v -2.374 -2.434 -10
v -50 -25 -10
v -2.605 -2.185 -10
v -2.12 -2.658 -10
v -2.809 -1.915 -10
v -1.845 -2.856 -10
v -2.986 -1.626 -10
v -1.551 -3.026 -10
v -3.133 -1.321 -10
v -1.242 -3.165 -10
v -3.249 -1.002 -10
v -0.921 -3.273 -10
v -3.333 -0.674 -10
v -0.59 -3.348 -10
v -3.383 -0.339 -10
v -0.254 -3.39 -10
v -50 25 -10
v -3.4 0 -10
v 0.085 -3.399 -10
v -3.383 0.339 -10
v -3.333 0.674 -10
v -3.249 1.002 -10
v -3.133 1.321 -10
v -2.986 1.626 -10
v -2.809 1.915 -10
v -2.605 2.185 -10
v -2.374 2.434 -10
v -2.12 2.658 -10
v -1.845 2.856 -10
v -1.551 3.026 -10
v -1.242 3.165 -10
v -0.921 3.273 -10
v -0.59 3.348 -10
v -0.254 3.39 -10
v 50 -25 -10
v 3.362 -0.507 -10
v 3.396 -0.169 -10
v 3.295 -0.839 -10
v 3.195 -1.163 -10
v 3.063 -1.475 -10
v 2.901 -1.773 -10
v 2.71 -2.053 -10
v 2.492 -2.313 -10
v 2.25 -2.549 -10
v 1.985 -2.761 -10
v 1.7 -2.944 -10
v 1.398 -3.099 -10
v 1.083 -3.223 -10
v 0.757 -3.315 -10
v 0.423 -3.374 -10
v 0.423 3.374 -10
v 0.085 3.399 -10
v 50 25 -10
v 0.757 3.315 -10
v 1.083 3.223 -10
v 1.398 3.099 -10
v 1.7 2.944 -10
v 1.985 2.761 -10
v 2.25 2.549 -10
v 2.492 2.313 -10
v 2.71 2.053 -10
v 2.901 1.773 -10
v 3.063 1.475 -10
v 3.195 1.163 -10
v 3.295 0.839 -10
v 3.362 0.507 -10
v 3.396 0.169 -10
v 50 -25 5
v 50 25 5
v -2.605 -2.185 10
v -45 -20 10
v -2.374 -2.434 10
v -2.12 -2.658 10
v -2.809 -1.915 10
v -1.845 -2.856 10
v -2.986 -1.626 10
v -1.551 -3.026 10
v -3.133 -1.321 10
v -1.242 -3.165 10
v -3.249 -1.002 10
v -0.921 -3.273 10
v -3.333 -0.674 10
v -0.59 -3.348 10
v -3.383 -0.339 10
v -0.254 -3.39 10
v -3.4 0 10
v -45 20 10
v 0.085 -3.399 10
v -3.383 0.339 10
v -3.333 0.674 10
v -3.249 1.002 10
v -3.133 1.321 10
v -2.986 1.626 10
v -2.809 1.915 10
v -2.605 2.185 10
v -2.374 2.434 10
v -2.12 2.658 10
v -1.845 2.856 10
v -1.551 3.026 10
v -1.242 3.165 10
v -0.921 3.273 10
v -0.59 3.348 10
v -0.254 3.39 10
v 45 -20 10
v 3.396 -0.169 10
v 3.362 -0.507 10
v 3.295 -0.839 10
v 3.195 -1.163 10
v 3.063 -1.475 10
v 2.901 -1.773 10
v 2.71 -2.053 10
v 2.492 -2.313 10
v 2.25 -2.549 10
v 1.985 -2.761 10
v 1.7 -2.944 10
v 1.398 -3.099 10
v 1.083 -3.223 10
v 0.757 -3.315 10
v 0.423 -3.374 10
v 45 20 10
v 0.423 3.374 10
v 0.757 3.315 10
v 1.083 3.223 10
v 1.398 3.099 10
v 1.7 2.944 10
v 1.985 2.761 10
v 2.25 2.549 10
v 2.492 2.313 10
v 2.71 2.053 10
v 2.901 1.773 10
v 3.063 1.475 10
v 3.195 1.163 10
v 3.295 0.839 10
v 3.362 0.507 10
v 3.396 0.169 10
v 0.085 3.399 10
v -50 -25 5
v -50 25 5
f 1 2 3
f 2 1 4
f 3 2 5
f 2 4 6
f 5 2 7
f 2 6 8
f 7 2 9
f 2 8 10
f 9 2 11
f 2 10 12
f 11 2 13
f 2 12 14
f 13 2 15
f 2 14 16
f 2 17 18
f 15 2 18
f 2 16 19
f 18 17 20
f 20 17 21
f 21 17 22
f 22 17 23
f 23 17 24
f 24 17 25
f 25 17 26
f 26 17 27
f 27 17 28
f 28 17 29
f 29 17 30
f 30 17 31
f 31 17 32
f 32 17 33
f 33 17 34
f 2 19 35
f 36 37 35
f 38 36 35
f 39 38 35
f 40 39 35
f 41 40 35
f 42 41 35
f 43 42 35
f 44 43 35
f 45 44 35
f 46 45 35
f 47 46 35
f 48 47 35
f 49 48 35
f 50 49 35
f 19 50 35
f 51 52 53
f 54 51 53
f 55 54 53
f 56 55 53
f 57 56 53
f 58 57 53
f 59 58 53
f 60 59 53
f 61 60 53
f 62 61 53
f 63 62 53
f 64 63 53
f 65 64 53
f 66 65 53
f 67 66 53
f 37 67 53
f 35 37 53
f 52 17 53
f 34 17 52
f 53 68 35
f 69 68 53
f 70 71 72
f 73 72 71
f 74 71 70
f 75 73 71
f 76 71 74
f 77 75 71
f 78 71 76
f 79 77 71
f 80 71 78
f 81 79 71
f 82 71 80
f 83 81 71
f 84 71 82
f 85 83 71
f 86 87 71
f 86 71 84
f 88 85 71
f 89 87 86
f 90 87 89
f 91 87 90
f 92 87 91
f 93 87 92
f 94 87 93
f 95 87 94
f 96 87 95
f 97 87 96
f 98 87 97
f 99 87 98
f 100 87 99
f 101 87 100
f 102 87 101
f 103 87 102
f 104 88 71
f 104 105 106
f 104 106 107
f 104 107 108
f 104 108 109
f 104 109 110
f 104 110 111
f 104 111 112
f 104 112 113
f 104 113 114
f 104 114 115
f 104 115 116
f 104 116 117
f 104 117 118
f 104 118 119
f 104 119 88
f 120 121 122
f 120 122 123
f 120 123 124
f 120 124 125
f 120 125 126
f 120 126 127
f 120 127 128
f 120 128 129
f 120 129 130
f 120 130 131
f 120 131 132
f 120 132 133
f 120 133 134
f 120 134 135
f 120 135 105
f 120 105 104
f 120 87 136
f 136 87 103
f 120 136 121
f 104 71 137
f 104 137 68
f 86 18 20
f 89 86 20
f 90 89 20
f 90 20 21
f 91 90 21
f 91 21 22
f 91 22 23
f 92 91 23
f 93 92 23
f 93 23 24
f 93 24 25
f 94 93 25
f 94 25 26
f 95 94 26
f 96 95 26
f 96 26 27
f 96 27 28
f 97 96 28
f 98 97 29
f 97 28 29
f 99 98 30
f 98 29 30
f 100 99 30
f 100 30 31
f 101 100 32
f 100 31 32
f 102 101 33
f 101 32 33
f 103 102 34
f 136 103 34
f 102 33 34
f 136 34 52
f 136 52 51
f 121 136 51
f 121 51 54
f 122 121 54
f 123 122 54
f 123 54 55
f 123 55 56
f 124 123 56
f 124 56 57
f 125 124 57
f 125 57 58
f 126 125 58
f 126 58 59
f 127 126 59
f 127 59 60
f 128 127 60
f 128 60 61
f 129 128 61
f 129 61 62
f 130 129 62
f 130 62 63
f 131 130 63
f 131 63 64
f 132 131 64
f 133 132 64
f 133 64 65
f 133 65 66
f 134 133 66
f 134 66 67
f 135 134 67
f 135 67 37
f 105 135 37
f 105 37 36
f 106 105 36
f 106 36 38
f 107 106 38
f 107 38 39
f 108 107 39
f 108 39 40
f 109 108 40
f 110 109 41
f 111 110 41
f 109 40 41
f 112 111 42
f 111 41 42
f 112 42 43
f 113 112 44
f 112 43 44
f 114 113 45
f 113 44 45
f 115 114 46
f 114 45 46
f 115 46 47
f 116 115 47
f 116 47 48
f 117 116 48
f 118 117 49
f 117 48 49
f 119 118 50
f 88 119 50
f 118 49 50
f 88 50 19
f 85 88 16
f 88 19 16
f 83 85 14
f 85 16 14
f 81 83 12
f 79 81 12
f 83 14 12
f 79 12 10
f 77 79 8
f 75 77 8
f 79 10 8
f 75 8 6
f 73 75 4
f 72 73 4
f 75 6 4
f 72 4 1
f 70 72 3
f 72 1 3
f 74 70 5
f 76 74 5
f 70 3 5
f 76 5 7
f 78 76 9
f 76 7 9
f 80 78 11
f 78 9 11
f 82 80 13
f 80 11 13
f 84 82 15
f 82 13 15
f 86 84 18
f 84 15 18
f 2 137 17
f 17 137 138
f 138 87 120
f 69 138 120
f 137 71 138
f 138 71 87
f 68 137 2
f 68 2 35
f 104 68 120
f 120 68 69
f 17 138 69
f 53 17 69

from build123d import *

# Parameters (mm, degrees)
F0_W     = 100
F0_H     = 50
F1_DEPTH = 10
F3_D     = 6.8
F4_SIZE  = 5


with BuildPart() as f1:
    # F0 (on Top) → F1 (new body, symmetric)
    with BuildSketch(Plane.XY):
        Rectangle(F0_W, F0_H)
    extrude(amount=F1_DEPTH, both=True)

    # F3 (through all)
    with Locations(Plane.XY.offset(10)):
        with Locations((0, 0)):
            Hole(F3_D / 2)

    # F4
    f4_edges = [f1.edges().sort_by_distance(p)[0] for p in [
        (-50, 0, 10),
        (0, -25, 10),
        (50, 0, 10),
        (0, 25, 10),
    ]]
    chamfer(f4_edges, length=F4_SIZE)


solid = f1.part
